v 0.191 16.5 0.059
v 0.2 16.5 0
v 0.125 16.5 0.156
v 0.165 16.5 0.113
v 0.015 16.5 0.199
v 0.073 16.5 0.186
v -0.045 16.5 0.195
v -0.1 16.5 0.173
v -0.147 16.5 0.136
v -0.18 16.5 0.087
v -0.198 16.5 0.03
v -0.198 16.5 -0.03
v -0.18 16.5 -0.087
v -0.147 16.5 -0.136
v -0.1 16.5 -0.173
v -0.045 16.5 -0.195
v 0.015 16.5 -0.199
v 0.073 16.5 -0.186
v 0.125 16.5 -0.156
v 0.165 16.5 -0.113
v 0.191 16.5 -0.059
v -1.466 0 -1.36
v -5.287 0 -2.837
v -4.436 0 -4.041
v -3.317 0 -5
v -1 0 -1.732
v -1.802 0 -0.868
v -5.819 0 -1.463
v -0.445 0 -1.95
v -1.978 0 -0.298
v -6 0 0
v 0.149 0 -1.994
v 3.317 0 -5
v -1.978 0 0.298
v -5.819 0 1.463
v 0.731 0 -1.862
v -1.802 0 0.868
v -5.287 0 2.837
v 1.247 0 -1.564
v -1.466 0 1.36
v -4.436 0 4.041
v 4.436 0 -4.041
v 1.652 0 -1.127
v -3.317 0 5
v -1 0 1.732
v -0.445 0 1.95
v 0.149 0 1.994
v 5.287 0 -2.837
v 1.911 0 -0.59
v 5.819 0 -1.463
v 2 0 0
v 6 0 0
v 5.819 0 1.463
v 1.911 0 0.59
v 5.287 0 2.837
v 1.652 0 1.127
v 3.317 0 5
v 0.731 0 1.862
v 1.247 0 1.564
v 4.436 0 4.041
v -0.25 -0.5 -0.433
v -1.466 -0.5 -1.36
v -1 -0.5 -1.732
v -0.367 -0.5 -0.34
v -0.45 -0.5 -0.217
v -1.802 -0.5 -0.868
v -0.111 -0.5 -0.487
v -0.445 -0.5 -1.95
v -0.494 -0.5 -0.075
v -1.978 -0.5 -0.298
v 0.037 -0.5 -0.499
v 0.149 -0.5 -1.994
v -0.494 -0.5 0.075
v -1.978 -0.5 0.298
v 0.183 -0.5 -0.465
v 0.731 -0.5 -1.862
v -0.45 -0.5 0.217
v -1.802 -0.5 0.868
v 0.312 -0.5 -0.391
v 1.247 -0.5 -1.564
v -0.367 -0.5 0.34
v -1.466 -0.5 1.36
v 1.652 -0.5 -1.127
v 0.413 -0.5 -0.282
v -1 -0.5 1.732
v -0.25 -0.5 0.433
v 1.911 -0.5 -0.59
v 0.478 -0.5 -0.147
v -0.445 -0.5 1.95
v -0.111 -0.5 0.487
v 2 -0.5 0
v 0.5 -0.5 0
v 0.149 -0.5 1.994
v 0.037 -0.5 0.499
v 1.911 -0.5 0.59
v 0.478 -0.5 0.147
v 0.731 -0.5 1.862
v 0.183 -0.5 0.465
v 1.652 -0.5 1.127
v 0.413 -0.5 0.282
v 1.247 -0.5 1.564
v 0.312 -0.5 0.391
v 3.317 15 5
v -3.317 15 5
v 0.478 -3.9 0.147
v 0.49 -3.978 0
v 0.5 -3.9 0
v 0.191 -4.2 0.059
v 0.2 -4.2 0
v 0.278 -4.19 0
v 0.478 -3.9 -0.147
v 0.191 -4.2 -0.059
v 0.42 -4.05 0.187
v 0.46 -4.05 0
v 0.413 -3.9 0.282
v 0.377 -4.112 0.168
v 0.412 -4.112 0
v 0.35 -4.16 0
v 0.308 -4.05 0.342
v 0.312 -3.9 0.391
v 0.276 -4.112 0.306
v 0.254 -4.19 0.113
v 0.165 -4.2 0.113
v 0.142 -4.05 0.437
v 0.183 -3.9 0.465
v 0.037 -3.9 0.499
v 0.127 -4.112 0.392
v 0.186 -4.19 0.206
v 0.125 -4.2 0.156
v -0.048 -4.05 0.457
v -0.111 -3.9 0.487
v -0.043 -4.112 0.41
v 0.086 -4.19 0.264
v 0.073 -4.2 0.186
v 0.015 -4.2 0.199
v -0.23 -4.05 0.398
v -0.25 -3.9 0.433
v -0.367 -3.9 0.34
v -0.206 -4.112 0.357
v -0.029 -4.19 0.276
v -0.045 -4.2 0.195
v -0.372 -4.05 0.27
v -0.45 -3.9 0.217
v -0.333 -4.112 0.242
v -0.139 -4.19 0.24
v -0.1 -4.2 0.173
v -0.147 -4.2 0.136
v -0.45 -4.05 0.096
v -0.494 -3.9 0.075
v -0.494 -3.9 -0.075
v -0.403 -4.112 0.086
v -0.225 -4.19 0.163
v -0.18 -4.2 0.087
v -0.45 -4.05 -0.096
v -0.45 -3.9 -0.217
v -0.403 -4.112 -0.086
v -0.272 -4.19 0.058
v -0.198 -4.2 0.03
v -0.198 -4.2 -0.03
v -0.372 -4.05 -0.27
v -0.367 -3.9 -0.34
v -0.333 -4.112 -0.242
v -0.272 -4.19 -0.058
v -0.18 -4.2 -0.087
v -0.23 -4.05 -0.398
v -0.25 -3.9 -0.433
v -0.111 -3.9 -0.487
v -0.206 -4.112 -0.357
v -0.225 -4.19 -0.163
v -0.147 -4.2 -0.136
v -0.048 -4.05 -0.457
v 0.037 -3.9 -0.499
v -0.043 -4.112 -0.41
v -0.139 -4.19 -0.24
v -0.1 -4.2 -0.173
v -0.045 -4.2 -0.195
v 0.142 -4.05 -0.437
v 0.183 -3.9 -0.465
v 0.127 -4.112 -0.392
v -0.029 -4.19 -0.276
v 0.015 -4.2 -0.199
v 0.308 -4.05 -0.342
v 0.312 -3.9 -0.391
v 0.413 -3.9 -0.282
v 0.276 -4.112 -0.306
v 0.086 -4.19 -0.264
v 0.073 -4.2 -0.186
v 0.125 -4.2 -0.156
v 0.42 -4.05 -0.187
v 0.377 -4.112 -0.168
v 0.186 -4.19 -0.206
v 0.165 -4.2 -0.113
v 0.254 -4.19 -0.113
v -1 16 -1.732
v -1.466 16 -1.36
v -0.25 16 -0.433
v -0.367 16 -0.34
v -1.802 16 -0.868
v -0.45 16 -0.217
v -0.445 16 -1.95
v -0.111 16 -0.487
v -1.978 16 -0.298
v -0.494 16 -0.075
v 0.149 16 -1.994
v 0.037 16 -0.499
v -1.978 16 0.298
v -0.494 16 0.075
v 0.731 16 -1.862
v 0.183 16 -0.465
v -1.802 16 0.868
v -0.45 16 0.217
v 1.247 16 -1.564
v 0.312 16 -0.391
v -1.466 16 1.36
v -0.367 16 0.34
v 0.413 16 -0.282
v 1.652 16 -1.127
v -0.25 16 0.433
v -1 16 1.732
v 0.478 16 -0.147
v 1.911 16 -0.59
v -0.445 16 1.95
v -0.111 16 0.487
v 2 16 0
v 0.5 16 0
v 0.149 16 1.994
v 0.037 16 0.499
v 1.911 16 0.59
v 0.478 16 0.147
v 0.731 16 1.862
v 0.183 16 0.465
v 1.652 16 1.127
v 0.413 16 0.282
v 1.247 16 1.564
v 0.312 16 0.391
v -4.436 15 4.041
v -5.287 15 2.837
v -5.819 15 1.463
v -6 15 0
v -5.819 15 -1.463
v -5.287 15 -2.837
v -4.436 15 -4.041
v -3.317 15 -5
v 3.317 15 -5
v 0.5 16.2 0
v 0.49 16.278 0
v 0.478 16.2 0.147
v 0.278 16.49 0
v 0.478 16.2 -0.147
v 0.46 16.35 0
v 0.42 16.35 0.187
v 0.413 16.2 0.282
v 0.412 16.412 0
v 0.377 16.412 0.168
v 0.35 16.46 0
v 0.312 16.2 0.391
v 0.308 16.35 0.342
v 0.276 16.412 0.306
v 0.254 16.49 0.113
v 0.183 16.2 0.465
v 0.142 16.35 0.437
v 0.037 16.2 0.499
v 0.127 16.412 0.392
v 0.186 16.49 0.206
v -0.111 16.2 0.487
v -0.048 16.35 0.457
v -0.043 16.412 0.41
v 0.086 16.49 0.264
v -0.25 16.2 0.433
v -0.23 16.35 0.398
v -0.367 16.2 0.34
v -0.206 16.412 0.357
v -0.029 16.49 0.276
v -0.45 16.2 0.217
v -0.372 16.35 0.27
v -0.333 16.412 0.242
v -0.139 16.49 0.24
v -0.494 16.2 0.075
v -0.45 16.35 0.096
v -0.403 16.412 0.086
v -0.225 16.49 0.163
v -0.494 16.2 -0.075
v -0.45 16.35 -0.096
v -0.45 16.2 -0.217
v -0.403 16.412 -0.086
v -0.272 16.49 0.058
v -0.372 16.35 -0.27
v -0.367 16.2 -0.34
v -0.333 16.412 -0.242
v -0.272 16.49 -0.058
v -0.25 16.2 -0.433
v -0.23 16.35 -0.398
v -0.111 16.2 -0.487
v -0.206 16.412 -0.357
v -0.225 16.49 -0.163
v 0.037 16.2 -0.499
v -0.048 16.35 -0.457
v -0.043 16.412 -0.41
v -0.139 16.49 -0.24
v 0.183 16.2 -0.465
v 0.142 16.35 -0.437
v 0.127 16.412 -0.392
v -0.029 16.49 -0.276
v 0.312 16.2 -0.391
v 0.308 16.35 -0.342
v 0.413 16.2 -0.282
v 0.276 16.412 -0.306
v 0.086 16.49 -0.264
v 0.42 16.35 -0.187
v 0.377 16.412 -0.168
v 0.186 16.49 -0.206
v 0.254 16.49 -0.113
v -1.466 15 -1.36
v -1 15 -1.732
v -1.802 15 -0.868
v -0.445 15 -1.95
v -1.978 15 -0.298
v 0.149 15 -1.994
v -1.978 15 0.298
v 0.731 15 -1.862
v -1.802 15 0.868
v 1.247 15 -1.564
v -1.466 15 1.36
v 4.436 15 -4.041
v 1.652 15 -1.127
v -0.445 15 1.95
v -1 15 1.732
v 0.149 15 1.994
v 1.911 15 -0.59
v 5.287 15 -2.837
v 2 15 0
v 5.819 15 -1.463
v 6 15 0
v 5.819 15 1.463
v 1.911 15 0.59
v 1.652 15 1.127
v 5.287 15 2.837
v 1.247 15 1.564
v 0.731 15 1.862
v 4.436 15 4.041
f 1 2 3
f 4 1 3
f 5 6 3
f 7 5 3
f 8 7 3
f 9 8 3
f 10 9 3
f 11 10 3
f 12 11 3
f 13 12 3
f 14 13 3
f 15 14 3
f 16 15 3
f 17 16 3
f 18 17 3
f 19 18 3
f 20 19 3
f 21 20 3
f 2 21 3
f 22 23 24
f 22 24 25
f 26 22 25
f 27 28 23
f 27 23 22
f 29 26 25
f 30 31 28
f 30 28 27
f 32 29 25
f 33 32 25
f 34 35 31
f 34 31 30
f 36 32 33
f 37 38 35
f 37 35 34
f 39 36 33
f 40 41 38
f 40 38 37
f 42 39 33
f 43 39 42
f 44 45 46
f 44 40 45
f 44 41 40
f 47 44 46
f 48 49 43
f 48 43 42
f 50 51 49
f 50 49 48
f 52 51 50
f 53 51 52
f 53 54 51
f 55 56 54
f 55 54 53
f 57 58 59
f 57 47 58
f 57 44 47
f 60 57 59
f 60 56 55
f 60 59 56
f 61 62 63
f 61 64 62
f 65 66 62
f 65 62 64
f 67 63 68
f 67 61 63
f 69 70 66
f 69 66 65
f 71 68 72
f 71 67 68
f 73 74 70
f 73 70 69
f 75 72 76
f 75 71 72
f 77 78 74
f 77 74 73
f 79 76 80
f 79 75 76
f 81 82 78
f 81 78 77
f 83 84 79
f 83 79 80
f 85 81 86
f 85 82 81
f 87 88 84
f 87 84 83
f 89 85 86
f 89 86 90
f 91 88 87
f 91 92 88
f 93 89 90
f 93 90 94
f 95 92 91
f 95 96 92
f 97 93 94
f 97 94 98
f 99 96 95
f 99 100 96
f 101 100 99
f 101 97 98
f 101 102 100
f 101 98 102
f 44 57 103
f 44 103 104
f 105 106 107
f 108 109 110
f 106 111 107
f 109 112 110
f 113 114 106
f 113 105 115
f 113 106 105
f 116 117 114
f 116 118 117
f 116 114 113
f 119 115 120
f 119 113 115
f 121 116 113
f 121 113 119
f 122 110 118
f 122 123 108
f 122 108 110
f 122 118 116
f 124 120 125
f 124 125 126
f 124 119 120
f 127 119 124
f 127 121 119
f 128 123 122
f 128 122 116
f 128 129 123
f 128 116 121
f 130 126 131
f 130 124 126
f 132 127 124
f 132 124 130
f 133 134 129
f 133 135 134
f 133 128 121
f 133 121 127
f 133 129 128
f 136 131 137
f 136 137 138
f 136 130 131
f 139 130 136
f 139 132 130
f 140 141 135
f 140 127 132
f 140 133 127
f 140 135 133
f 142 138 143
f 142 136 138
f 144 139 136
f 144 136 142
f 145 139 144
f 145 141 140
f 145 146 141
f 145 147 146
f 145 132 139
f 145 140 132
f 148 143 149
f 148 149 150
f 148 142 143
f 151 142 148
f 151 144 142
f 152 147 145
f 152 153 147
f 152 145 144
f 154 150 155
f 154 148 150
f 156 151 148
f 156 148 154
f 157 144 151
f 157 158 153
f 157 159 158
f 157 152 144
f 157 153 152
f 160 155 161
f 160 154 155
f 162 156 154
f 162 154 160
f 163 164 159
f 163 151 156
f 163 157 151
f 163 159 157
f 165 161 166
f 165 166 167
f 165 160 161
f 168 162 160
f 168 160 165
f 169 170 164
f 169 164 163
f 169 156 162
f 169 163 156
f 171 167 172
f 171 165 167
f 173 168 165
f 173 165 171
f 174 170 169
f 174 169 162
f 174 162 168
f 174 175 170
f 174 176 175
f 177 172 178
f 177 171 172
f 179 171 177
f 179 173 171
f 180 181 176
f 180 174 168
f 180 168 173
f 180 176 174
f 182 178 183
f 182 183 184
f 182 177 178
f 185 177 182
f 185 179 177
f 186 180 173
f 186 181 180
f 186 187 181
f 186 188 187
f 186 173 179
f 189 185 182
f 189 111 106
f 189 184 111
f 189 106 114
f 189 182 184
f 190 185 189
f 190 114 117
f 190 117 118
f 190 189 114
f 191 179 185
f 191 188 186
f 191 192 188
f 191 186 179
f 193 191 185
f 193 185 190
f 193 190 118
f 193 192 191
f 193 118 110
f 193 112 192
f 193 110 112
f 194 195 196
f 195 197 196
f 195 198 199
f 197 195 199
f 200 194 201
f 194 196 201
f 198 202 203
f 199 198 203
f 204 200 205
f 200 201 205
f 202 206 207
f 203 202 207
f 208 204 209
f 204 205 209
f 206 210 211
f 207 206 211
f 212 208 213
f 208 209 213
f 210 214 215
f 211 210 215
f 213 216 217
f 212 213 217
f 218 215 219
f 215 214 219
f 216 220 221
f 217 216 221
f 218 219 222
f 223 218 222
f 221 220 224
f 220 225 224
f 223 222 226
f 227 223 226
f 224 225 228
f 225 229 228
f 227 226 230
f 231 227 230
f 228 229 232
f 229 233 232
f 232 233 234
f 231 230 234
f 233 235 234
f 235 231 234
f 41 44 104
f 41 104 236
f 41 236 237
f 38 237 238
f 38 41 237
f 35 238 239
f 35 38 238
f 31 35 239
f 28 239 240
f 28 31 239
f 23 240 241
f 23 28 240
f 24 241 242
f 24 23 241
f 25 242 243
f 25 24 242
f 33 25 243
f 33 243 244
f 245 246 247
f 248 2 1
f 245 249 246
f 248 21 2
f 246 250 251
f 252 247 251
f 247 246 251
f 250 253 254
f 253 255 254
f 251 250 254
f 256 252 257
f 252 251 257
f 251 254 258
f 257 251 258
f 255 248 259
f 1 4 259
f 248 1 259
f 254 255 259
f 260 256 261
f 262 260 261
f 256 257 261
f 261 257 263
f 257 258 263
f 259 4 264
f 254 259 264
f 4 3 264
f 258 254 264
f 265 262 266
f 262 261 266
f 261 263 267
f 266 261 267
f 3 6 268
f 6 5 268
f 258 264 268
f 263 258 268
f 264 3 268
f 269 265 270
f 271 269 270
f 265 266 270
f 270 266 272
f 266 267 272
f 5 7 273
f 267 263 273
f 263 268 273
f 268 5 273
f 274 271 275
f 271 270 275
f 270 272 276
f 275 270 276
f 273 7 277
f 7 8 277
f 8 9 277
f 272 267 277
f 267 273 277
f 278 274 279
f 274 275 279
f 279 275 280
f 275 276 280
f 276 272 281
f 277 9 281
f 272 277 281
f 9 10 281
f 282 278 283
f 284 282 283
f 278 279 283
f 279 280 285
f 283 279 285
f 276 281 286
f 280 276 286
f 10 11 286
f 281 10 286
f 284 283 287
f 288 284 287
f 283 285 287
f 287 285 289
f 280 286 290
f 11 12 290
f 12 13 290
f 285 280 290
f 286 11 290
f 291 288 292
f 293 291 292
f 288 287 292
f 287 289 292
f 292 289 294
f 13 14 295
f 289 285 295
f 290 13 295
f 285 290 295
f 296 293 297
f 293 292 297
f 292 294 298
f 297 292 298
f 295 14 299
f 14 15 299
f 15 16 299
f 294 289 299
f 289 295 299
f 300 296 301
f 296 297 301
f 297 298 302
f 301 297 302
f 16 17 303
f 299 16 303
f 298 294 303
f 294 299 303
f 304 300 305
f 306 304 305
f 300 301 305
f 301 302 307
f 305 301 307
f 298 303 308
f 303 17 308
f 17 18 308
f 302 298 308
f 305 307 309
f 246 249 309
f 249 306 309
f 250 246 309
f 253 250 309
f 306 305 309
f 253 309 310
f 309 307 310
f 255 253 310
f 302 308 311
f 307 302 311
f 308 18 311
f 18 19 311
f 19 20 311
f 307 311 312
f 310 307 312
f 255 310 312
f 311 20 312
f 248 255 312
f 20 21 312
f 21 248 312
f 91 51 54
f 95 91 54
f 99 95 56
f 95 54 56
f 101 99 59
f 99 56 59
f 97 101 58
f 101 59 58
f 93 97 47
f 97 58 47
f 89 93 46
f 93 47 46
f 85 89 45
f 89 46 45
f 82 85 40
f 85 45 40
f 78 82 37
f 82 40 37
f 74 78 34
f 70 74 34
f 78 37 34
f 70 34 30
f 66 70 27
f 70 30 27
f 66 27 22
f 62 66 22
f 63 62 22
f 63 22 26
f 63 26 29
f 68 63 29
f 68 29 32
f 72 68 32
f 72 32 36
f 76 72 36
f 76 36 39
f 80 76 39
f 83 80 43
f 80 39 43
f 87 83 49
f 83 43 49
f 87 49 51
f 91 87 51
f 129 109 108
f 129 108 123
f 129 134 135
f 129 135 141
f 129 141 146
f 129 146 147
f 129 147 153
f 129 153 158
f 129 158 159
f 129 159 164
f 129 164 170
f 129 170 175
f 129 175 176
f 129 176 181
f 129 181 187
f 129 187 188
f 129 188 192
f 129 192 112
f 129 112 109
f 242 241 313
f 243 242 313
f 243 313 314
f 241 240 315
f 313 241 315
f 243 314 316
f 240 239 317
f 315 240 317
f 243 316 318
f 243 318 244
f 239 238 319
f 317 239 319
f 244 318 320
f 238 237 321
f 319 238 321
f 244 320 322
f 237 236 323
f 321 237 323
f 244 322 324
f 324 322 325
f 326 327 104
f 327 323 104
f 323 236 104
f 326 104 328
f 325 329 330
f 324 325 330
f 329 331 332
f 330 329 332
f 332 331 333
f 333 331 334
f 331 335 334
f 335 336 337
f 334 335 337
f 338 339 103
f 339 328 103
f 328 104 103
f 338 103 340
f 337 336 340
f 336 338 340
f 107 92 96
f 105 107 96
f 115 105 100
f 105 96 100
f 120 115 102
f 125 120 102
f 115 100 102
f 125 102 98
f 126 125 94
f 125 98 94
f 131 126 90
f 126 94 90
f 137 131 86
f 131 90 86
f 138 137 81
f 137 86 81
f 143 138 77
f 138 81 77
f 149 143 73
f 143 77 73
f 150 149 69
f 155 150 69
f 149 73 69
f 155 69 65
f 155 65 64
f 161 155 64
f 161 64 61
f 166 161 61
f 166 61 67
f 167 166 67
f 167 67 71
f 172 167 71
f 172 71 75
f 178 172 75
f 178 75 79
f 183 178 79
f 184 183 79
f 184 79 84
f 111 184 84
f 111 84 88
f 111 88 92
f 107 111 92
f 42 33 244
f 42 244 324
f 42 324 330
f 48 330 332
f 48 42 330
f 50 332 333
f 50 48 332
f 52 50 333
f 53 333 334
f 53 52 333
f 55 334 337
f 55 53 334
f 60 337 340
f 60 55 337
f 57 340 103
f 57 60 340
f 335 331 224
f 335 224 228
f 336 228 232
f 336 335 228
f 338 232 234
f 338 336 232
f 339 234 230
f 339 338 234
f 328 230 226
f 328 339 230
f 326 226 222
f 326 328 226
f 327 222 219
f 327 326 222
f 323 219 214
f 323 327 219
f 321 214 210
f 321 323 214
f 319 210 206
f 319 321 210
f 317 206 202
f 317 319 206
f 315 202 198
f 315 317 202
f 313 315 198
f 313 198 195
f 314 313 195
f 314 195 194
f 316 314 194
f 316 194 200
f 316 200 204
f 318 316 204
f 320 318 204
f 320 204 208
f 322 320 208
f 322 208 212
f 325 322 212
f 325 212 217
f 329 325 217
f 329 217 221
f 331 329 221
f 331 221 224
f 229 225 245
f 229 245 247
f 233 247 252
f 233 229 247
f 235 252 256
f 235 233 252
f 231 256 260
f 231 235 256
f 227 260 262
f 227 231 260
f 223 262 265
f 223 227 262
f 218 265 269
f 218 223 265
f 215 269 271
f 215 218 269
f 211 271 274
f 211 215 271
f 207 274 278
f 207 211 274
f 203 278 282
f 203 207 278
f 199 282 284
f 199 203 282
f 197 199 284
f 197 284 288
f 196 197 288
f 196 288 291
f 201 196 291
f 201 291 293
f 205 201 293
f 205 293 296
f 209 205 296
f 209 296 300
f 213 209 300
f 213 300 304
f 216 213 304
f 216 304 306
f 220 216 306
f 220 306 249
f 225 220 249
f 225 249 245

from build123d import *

# Parameters (mm, degrees)
F0_R          = 0.5
F0_R_2        = 2
F1_DEPTH      = 15
F2_DEPTH      = 0.5
F2_DEPTH_BACK = 16
F3_DEPTH      = 4.2
F3_DEPTH_BACK = 16.5
F4_R          = 0.3


with BuildPart() as f1:
    # F0 (on Front) → F1 (new body)
    with BuildSketch(Plane.XZ):
        Circle(F0_R)
        Circle(F0_R_2)
        Circle(F0_R, mode=Mode.SUBTRACT)
        with BuildLine():
            Line((-3.316625, -5), (3.316625, -5))
            ThreePointArc((3.316625, -5), (6, 0), (3.316625, 5))
            Line((3.316625, 5), (-3.316625, 5))
            ThreePointArc((-3.316625, 5), (-6, 0), (-3.316625, -5))
        make_face()
        Circle(F0_R_2, mode=Mode.SUBTRACT)
    extrude(amount=-F1_DEPTH)

    # F0 (on Front) → F2 (join, two sides)
    with BuildSketch(Plane.XZ) as f2_sk:
        Circle(F0_R)
        Circle(F0_R_2)
        Circle(F0_R, mode=Mode.SUBTRACT)
    extrude(amount=F2_DEPTH)
    extrude(f2_sk.sketch, amount=-F2_DEPTH_BACK)

    # F0 (on Front) → F3 (join, two sides)
    with BuildSketch(Plane.XZ) as f3_sk:
        Circle(F0_R)
    extrude(amount=F3_DEPTH)
    extrude(f3_sk.sketch, amount=-F3_DEPTH_BACK)

    # F4
    f4_edges = [f1.edges().sort_by_distance(p)[0] for p in [
        (-0.5, -4.2, 0),
        (-0.5, 16.5, 0),
    ]]
    fillet(f4_edges, radius=F4_R)


solid = f1.part
